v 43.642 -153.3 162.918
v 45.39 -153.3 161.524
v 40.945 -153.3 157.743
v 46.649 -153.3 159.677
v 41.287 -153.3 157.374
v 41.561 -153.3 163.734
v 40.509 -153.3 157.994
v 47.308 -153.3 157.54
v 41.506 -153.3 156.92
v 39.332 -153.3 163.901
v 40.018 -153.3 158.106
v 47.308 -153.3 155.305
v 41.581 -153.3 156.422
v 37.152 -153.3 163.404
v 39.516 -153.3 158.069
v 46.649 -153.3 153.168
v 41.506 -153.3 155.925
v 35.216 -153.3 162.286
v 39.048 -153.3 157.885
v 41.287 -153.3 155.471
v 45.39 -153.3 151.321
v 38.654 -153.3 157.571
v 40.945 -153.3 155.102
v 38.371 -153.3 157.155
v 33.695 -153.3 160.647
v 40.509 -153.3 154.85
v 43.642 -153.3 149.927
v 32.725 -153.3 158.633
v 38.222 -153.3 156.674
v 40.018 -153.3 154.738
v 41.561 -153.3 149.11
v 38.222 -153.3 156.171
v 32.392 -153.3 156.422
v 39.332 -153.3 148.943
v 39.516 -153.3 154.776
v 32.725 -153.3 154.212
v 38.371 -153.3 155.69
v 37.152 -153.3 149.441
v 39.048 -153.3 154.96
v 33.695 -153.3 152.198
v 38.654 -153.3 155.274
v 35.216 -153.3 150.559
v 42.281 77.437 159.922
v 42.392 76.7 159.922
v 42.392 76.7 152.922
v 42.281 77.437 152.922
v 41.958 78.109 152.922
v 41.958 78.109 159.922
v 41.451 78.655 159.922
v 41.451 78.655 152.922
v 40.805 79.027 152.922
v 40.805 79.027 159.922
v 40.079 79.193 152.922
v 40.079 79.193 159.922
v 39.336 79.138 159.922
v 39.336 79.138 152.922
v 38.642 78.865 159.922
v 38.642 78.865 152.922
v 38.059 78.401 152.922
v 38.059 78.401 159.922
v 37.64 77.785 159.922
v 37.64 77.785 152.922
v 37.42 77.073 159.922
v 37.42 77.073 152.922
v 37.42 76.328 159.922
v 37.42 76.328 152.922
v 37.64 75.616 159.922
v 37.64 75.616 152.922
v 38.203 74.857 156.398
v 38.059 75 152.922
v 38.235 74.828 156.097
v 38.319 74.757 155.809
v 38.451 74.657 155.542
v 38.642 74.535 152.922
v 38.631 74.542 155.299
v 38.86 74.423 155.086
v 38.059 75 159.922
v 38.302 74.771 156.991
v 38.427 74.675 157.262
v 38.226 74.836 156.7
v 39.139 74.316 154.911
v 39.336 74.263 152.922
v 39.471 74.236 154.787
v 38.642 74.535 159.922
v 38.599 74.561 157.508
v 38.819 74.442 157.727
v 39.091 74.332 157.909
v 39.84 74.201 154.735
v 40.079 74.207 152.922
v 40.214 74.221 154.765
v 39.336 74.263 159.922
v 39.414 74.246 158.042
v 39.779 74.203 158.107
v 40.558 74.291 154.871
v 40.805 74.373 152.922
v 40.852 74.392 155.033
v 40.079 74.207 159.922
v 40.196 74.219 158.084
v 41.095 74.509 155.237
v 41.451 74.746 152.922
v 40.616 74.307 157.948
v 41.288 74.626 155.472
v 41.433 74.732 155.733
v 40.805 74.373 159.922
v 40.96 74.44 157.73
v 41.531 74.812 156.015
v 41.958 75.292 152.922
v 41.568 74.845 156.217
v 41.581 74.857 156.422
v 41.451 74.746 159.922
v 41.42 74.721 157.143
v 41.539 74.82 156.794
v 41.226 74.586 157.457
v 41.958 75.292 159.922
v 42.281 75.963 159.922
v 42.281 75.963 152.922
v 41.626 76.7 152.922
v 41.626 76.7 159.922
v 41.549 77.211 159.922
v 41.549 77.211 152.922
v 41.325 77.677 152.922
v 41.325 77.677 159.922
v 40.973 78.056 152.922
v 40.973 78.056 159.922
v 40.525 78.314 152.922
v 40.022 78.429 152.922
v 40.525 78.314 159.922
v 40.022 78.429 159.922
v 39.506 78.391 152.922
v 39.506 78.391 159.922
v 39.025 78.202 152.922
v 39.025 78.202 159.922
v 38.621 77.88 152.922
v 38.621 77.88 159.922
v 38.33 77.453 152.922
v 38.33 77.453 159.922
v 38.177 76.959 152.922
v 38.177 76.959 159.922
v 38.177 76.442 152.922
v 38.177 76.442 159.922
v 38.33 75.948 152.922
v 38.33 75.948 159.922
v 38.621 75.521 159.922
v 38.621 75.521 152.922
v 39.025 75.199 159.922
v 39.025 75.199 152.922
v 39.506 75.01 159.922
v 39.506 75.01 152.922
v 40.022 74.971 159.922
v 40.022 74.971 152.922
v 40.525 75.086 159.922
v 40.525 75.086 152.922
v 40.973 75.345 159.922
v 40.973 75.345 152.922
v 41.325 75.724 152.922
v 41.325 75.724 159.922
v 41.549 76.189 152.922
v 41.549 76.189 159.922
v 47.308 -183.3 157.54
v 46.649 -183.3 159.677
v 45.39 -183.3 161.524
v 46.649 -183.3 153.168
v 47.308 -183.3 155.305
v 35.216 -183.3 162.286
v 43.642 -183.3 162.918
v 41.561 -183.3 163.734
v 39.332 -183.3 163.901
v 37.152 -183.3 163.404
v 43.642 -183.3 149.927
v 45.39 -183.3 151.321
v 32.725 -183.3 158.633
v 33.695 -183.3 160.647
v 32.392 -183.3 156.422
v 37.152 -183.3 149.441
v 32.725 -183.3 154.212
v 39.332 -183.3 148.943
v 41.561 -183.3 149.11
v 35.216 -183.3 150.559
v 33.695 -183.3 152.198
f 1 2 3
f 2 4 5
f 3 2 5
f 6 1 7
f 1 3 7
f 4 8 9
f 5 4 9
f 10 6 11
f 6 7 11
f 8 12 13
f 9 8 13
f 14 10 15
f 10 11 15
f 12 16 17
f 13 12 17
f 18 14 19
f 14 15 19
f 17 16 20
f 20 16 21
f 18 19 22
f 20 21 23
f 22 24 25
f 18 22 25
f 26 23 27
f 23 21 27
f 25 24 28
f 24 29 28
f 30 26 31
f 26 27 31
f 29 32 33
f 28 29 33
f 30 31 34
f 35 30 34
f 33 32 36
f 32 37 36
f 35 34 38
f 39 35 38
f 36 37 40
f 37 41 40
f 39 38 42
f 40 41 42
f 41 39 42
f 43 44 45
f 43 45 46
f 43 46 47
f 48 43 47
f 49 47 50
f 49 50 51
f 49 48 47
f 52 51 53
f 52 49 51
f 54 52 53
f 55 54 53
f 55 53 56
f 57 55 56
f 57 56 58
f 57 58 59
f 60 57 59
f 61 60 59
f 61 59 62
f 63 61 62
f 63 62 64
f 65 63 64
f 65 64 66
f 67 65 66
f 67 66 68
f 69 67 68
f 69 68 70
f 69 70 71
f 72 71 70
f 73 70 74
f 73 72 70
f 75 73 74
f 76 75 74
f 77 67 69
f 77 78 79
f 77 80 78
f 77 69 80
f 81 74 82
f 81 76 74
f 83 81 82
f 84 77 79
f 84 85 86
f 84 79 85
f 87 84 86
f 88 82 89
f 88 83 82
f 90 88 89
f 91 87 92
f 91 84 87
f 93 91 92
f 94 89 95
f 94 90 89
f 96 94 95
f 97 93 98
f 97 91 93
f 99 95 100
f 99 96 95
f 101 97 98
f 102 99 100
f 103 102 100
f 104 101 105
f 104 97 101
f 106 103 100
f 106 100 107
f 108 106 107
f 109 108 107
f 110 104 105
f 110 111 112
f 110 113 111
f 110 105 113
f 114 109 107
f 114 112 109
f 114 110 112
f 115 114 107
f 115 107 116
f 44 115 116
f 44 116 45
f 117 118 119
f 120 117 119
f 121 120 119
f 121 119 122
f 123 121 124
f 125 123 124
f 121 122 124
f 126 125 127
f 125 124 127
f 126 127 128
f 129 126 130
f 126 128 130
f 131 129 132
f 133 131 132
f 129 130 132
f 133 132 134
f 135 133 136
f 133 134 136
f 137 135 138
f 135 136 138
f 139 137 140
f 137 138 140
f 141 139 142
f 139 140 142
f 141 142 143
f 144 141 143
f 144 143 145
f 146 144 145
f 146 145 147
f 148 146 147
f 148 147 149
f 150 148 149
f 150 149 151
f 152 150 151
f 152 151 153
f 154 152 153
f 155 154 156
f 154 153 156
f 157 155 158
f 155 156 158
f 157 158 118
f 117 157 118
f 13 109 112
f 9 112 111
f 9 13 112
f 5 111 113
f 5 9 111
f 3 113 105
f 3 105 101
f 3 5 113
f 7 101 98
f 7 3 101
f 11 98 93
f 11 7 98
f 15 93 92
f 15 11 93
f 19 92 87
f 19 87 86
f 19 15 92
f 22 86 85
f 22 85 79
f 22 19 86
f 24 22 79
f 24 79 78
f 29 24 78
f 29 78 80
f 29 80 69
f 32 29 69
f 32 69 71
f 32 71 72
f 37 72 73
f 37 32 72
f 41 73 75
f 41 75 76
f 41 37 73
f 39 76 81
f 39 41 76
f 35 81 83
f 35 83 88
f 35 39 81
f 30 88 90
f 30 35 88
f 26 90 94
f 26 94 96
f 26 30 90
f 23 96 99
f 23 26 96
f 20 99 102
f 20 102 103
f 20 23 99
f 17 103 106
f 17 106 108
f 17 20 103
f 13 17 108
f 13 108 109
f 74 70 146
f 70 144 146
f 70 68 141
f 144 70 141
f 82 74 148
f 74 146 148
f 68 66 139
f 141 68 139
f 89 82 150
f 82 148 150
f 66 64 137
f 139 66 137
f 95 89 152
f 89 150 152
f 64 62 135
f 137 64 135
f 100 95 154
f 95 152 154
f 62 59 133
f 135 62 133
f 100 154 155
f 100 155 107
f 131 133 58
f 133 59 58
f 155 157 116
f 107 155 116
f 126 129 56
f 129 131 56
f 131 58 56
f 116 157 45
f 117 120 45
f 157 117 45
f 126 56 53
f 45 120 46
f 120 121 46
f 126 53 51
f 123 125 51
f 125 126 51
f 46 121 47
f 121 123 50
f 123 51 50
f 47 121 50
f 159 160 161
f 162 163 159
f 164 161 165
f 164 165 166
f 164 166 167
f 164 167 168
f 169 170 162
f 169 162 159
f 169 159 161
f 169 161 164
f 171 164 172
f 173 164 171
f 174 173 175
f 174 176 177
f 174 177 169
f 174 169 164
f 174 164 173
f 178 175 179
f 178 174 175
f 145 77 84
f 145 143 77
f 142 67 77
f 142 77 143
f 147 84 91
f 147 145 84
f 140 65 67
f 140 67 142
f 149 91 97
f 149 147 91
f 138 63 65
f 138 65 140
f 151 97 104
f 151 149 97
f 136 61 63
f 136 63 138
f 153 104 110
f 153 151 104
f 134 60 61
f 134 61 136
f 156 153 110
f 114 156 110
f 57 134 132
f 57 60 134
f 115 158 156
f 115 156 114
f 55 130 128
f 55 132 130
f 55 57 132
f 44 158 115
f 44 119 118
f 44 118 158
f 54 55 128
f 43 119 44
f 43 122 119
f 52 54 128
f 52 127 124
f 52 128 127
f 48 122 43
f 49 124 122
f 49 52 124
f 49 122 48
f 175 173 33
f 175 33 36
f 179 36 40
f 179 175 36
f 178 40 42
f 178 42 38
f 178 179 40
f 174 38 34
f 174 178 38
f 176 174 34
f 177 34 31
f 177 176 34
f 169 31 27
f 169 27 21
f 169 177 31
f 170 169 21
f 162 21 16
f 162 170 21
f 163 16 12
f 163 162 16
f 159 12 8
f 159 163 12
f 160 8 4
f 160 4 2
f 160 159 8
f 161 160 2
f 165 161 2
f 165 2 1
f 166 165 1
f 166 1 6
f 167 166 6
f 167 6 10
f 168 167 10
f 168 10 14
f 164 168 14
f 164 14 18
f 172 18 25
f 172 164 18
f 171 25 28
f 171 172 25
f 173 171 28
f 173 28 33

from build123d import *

# Parameters (mm, degrees)
BOSS_EXTRUDE1_START      = -7
SKETCH1_R                = 2.5
SKETCH1_R_2              = 1.733910687
BOSS_EXTRUDE1_DEPTH      = 7
SKETCH2_R                = 1.688720836
BOSS_EXTRUDE2_DEPTH      = 200
BOSS_EXTRUDE2_DEPTH_BACK = 38.25
BOSS_EXTRUDE3_START      = 20
SKETCH3_R                = 7.5
BOSS_EXTRUDE3_DEPTH      = 30


with BuildPart() as part:
    # Sketch1 → Boss-Extrude1 (new body)
    with BuildSketch(Plane.XY.offset(166.922438479).offset(BOSS_EXTRUDE1_START)):
        with Locations((39.892028068, 76.700259913)):
            Circle(SKETCH1_R)
        with Locations((39.892028068, 76.700259913)):
            Circle(SKETCH1_R_2, mode=Mode.SUBTRACT)
    extrude(amount=-BOSS_EXTRUDE1_DEPTH)

    # Sketch2 → Boss-Extrude2 (add, two sides)
    with BuildSketch(Plane.XZ.offset(-36.700259913)) as boss_extrude2_sk:
        with Locations((39.892028068, 156.422438479)):
            Circle(SKETCH2_R)
    extrude(amount=BOSS_EXTRUDE2_DEPTH)
    extrude(boss_extrude2_sk.sketch, amount=-BOSS_EXTRUDE2_DEPTH_BACK)

    # Sketch3 → Boss-Extrude3 (add)
    with BuildSketch(Plane(origin=(0, -163.299740087, 0), x_dir=(-1, 0, 0), z_dir=(0, -1, 0)).offset(BOSS_EXTRUDE3_START)):
        with Locations((-39.892028068, -156.422438479)):
            Circle(SKETCH3_R)
    extrude(amount=-BOSS_EXTRUDE3_DEPTH)


solid = part.part
